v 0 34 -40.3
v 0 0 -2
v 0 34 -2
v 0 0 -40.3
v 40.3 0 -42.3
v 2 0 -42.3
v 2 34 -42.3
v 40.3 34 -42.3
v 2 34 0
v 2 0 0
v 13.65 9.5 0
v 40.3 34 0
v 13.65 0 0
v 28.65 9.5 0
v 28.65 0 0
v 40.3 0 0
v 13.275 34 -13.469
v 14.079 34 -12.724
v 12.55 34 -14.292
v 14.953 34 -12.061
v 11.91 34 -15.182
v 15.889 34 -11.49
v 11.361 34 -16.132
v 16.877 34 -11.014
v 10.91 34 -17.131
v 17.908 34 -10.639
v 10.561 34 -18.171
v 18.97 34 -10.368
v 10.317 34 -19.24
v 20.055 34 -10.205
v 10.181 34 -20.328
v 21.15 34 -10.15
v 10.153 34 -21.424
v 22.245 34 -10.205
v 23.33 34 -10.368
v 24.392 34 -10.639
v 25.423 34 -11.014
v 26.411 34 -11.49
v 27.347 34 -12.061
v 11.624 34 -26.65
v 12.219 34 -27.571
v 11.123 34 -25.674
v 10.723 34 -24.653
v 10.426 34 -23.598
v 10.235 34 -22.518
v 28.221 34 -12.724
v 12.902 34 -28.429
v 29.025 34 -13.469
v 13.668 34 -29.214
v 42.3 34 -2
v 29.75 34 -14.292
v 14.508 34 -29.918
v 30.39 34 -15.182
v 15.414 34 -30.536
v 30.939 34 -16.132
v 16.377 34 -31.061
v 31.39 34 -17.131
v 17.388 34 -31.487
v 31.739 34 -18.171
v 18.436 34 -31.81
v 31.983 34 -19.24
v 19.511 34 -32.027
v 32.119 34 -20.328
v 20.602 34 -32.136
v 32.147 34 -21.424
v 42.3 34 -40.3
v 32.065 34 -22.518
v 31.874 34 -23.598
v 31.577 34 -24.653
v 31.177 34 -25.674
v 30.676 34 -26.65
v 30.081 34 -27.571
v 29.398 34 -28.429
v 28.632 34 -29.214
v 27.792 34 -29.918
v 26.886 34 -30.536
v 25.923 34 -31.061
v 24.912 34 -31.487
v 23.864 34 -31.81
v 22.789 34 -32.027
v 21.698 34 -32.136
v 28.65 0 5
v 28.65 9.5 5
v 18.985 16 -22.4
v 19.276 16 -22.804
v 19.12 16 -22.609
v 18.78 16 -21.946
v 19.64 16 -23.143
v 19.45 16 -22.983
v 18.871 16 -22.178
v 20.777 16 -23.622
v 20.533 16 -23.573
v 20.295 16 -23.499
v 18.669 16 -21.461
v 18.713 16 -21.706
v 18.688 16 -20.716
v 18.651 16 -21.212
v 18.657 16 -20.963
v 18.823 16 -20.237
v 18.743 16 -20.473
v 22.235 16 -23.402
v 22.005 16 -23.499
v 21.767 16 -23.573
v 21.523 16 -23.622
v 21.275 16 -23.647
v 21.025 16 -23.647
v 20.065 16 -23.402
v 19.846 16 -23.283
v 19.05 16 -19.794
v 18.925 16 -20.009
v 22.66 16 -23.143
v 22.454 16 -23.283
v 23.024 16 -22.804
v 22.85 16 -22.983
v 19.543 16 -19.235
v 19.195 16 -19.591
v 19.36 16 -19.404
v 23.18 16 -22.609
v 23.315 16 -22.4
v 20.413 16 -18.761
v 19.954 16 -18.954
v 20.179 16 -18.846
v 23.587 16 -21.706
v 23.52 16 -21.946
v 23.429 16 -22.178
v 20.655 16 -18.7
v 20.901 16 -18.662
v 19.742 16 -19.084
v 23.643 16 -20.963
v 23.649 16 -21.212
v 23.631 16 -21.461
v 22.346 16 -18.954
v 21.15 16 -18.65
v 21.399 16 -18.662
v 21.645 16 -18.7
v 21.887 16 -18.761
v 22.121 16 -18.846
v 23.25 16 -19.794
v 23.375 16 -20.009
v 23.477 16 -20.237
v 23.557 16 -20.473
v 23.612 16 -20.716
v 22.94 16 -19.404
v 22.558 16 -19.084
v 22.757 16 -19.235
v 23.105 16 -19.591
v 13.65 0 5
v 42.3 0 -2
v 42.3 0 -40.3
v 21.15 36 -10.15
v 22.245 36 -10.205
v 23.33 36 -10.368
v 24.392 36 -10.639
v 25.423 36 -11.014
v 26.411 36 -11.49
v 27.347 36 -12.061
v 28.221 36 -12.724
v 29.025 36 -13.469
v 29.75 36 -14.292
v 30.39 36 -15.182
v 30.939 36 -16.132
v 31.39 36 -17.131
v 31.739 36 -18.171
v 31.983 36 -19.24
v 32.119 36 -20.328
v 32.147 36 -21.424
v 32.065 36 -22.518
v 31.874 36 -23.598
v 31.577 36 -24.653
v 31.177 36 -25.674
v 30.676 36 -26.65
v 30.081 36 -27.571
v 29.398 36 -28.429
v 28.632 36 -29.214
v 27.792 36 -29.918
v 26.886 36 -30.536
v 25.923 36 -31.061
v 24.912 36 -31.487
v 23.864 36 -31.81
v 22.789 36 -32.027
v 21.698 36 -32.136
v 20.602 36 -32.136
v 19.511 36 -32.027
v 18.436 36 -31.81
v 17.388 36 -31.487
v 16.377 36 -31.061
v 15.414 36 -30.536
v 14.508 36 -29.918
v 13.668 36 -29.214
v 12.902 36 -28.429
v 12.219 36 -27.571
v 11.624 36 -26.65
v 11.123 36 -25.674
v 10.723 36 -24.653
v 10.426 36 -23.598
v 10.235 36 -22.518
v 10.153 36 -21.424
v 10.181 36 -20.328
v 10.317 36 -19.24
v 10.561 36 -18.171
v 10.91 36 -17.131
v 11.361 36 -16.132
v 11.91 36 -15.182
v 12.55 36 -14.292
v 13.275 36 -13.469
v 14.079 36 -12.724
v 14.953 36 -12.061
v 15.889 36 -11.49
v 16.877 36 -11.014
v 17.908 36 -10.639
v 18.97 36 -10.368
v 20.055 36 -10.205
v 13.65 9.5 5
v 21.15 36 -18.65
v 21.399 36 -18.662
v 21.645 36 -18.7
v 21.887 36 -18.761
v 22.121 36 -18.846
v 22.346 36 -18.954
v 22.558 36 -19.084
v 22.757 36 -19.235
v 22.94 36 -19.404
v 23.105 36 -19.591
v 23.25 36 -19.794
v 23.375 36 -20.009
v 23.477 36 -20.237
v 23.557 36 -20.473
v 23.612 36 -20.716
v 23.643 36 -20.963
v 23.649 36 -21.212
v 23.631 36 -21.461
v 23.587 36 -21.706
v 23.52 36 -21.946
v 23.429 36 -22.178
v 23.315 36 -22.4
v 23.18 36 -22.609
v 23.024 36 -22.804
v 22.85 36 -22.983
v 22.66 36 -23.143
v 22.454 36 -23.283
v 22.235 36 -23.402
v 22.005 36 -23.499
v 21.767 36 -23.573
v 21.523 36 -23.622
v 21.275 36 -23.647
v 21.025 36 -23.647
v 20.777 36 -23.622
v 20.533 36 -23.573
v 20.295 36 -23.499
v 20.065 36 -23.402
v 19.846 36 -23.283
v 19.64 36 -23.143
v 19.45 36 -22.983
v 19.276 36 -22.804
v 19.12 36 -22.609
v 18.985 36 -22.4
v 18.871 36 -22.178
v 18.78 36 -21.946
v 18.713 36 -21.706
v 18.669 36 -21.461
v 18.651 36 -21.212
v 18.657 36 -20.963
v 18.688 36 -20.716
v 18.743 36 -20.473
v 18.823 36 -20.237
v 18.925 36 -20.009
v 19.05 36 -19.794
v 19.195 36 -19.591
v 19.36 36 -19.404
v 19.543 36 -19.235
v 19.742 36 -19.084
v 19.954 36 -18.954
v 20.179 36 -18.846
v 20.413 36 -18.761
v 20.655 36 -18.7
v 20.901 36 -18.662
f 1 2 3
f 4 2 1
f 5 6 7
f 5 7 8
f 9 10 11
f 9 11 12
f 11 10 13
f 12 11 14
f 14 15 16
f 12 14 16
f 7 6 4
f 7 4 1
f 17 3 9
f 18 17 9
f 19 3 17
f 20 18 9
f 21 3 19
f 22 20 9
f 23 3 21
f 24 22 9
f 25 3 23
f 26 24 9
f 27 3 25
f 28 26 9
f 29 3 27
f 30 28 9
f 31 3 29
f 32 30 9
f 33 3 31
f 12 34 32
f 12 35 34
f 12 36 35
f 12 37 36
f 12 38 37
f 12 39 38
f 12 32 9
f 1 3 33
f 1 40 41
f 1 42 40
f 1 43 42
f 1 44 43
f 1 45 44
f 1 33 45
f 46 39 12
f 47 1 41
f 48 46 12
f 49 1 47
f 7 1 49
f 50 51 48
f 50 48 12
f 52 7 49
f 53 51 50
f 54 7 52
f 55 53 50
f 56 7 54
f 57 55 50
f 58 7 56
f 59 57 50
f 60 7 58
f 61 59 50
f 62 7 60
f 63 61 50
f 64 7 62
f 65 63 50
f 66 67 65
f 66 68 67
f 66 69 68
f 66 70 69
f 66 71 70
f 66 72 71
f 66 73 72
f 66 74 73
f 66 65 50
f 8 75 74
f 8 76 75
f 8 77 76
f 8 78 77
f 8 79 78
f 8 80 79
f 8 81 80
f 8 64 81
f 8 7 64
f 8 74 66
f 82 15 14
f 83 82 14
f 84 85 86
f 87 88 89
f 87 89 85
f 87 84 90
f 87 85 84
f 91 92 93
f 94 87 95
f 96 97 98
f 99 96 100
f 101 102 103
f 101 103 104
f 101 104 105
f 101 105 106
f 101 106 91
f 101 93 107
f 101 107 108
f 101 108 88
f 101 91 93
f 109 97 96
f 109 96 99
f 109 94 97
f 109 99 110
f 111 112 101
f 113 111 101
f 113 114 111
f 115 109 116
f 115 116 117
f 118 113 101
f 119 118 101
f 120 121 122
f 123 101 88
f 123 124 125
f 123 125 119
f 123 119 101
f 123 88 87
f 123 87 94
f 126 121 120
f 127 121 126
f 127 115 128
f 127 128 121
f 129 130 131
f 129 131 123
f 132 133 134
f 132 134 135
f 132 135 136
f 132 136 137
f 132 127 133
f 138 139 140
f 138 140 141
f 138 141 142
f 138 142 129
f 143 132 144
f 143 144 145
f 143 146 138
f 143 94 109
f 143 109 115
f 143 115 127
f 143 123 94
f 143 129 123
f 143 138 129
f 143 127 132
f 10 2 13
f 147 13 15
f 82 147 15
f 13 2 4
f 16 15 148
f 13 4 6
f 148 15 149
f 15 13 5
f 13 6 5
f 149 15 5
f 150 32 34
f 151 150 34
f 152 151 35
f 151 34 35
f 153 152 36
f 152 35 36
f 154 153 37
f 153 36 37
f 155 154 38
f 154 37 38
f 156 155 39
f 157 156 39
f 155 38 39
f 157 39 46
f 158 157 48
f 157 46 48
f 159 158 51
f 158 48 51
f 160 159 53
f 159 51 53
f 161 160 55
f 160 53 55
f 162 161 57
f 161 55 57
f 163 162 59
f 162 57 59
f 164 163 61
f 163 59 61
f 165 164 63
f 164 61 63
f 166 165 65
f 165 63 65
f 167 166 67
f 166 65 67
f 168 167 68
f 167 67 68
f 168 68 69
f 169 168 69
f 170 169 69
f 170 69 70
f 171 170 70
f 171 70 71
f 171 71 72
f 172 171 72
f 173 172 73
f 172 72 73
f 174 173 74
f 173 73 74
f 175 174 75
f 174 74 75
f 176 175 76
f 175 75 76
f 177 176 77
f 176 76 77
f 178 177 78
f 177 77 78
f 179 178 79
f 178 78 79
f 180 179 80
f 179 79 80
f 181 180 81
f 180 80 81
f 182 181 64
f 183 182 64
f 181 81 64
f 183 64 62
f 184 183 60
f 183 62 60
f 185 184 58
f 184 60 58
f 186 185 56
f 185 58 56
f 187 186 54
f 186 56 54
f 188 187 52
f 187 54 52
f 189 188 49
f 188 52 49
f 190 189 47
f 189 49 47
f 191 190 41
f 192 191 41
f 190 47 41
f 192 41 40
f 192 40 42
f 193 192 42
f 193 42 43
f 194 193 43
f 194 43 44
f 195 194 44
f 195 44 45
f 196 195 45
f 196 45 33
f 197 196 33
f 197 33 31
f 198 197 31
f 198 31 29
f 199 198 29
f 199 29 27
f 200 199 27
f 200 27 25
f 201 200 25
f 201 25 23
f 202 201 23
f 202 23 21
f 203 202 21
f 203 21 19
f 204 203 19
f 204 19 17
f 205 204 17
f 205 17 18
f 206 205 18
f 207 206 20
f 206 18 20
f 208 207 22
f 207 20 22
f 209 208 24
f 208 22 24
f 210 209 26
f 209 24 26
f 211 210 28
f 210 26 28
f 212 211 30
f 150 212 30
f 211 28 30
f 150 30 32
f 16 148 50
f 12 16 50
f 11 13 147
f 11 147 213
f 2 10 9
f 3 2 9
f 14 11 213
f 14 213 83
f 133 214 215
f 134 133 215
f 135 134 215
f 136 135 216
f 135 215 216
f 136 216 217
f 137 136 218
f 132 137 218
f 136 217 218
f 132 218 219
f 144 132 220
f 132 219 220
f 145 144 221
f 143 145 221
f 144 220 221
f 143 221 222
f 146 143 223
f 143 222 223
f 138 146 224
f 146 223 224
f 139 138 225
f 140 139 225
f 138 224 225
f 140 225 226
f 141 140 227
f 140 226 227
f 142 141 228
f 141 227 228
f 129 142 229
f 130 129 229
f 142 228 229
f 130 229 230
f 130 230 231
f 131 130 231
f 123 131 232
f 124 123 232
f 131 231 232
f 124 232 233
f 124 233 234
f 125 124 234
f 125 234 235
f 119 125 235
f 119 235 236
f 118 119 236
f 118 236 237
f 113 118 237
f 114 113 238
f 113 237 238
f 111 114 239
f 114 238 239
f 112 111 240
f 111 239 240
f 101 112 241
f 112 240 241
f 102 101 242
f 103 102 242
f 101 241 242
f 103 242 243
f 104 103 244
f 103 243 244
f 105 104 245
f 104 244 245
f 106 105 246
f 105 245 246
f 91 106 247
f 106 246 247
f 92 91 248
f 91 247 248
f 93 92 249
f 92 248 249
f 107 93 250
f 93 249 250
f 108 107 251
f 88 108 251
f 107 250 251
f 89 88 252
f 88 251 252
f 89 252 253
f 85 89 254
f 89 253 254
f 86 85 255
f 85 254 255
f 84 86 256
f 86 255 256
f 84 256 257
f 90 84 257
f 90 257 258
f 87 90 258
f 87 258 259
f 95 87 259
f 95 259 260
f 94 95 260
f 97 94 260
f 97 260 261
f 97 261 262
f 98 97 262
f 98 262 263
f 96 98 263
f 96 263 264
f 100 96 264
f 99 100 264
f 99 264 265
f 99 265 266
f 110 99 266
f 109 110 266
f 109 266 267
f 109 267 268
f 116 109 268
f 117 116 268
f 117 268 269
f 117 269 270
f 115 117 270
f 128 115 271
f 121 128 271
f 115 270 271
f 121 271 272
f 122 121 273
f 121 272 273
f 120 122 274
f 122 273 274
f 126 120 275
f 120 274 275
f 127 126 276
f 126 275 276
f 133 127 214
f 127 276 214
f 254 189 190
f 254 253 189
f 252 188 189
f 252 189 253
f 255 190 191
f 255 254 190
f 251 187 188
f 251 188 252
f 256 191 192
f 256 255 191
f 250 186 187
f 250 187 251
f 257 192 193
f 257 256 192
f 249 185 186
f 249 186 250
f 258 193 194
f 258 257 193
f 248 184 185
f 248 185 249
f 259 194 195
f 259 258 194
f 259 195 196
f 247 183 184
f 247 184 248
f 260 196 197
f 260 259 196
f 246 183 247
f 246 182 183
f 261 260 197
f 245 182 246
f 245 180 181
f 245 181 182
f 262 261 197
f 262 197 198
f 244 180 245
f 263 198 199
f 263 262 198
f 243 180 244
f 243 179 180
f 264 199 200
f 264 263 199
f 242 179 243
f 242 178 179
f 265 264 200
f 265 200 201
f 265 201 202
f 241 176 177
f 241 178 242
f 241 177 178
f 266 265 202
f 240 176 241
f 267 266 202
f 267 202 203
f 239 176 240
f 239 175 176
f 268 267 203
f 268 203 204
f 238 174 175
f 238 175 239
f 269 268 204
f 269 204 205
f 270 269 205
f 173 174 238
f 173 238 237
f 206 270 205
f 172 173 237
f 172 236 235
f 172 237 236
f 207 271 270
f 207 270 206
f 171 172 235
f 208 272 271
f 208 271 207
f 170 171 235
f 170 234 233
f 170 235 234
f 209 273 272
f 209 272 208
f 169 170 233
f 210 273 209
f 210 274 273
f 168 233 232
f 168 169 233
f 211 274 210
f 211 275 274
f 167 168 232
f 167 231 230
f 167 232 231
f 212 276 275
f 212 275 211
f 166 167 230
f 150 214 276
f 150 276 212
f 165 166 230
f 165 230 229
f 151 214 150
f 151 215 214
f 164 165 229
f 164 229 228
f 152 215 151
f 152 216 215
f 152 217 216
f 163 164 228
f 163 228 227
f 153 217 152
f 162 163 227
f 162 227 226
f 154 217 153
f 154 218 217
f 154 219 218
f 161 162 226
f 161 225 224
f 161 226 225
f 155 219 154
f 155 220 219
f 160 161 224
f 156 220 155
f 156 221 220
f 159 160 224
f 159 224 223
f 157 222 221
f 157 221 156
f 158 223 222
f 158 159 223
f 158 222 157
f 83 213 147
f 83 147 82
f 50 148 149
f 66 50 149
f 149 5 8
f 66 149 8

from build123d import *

# Parameters (mm, degrees)
SKETCH1_W           = 42.3
SKETCH1_H           = 42.3
BOSS_EXTRUDE1_DEPTH = 34
CHAMFER2_SIZE       = 2
SKETCH2_R           = 11
BOSS_EXTRUDE2_DEPTH = 2
SKETCH3_R           = 2.5
CUT_EXTRUDE2_DEPTH  = 20
SKETCH5_W           = 15
SKETCH5_H           = 9.5
BOSS_EXTRUDE4_DEPTH = 5


with BuildPart() as part:
    # Sketch1 → Boss-Extrude1 (new body)
    with BuildSketch(Plane(origin=(0, 0, 0), x_dir=(1, 0, 0), z_dir=(0, 1, 0))):
        with Locations((21.15, 21.15)):
            Rectangle(SKETCH1_W, SKETCH1_H)
    extrude(amount=BOSS_EXTRUDE1_DEPTH)

    # Chamfer2
    chamfer2_edges = [part.edges().sort_by_distance(p)[0] for p in [
        (0, 17, -42.3),
        (42.3, 17, -42.3),
        (42.3, 17, 0),
        (0, 17, 0),
    ]]
    chamfer(chamfer2_edges, length=CHAMFER2_SIZE)

    # Sketch2 → Boss-Extrude2 (add)
    with BuildSketch(Plane(origin=(0, 34, 0), x_dir=(1, 0, 0), z_dir=(0, 1, 0))):
        with Locations(Location((21.15, 21.15, 0), (0, 0, 270))):
            Circle(SKETCH2_R)
    extrude(amount=BOSS_EXTRUDE2_DEPTH)

    # Sketch3 → Cut-Extrude2 (cut)
    with BuildSketch(Plane(origin=(0, 36, 0), x_dir=(1, 0, 0), z_dir=(0, 1, 0))):
        with Locations(Location((21.15, 21.15, 0), (0, 0, 270))):
            Circle(SKETCH3_R)
    extrude(amount=-CUT_EXTRUDE2_DEPTH, mode=Mode.SUBTRACT)

    # Sketch5 → Boss-Extrude4 (add)
    with BuildSketch(Plane.XY):
        with Locations((21.15, 4.75)):
            Rectangle(SKETCH5_W, SKETCH5_H)
    extrude(amount=BOSS_EXTRUDE4_DEPTH)


solid = part.part
